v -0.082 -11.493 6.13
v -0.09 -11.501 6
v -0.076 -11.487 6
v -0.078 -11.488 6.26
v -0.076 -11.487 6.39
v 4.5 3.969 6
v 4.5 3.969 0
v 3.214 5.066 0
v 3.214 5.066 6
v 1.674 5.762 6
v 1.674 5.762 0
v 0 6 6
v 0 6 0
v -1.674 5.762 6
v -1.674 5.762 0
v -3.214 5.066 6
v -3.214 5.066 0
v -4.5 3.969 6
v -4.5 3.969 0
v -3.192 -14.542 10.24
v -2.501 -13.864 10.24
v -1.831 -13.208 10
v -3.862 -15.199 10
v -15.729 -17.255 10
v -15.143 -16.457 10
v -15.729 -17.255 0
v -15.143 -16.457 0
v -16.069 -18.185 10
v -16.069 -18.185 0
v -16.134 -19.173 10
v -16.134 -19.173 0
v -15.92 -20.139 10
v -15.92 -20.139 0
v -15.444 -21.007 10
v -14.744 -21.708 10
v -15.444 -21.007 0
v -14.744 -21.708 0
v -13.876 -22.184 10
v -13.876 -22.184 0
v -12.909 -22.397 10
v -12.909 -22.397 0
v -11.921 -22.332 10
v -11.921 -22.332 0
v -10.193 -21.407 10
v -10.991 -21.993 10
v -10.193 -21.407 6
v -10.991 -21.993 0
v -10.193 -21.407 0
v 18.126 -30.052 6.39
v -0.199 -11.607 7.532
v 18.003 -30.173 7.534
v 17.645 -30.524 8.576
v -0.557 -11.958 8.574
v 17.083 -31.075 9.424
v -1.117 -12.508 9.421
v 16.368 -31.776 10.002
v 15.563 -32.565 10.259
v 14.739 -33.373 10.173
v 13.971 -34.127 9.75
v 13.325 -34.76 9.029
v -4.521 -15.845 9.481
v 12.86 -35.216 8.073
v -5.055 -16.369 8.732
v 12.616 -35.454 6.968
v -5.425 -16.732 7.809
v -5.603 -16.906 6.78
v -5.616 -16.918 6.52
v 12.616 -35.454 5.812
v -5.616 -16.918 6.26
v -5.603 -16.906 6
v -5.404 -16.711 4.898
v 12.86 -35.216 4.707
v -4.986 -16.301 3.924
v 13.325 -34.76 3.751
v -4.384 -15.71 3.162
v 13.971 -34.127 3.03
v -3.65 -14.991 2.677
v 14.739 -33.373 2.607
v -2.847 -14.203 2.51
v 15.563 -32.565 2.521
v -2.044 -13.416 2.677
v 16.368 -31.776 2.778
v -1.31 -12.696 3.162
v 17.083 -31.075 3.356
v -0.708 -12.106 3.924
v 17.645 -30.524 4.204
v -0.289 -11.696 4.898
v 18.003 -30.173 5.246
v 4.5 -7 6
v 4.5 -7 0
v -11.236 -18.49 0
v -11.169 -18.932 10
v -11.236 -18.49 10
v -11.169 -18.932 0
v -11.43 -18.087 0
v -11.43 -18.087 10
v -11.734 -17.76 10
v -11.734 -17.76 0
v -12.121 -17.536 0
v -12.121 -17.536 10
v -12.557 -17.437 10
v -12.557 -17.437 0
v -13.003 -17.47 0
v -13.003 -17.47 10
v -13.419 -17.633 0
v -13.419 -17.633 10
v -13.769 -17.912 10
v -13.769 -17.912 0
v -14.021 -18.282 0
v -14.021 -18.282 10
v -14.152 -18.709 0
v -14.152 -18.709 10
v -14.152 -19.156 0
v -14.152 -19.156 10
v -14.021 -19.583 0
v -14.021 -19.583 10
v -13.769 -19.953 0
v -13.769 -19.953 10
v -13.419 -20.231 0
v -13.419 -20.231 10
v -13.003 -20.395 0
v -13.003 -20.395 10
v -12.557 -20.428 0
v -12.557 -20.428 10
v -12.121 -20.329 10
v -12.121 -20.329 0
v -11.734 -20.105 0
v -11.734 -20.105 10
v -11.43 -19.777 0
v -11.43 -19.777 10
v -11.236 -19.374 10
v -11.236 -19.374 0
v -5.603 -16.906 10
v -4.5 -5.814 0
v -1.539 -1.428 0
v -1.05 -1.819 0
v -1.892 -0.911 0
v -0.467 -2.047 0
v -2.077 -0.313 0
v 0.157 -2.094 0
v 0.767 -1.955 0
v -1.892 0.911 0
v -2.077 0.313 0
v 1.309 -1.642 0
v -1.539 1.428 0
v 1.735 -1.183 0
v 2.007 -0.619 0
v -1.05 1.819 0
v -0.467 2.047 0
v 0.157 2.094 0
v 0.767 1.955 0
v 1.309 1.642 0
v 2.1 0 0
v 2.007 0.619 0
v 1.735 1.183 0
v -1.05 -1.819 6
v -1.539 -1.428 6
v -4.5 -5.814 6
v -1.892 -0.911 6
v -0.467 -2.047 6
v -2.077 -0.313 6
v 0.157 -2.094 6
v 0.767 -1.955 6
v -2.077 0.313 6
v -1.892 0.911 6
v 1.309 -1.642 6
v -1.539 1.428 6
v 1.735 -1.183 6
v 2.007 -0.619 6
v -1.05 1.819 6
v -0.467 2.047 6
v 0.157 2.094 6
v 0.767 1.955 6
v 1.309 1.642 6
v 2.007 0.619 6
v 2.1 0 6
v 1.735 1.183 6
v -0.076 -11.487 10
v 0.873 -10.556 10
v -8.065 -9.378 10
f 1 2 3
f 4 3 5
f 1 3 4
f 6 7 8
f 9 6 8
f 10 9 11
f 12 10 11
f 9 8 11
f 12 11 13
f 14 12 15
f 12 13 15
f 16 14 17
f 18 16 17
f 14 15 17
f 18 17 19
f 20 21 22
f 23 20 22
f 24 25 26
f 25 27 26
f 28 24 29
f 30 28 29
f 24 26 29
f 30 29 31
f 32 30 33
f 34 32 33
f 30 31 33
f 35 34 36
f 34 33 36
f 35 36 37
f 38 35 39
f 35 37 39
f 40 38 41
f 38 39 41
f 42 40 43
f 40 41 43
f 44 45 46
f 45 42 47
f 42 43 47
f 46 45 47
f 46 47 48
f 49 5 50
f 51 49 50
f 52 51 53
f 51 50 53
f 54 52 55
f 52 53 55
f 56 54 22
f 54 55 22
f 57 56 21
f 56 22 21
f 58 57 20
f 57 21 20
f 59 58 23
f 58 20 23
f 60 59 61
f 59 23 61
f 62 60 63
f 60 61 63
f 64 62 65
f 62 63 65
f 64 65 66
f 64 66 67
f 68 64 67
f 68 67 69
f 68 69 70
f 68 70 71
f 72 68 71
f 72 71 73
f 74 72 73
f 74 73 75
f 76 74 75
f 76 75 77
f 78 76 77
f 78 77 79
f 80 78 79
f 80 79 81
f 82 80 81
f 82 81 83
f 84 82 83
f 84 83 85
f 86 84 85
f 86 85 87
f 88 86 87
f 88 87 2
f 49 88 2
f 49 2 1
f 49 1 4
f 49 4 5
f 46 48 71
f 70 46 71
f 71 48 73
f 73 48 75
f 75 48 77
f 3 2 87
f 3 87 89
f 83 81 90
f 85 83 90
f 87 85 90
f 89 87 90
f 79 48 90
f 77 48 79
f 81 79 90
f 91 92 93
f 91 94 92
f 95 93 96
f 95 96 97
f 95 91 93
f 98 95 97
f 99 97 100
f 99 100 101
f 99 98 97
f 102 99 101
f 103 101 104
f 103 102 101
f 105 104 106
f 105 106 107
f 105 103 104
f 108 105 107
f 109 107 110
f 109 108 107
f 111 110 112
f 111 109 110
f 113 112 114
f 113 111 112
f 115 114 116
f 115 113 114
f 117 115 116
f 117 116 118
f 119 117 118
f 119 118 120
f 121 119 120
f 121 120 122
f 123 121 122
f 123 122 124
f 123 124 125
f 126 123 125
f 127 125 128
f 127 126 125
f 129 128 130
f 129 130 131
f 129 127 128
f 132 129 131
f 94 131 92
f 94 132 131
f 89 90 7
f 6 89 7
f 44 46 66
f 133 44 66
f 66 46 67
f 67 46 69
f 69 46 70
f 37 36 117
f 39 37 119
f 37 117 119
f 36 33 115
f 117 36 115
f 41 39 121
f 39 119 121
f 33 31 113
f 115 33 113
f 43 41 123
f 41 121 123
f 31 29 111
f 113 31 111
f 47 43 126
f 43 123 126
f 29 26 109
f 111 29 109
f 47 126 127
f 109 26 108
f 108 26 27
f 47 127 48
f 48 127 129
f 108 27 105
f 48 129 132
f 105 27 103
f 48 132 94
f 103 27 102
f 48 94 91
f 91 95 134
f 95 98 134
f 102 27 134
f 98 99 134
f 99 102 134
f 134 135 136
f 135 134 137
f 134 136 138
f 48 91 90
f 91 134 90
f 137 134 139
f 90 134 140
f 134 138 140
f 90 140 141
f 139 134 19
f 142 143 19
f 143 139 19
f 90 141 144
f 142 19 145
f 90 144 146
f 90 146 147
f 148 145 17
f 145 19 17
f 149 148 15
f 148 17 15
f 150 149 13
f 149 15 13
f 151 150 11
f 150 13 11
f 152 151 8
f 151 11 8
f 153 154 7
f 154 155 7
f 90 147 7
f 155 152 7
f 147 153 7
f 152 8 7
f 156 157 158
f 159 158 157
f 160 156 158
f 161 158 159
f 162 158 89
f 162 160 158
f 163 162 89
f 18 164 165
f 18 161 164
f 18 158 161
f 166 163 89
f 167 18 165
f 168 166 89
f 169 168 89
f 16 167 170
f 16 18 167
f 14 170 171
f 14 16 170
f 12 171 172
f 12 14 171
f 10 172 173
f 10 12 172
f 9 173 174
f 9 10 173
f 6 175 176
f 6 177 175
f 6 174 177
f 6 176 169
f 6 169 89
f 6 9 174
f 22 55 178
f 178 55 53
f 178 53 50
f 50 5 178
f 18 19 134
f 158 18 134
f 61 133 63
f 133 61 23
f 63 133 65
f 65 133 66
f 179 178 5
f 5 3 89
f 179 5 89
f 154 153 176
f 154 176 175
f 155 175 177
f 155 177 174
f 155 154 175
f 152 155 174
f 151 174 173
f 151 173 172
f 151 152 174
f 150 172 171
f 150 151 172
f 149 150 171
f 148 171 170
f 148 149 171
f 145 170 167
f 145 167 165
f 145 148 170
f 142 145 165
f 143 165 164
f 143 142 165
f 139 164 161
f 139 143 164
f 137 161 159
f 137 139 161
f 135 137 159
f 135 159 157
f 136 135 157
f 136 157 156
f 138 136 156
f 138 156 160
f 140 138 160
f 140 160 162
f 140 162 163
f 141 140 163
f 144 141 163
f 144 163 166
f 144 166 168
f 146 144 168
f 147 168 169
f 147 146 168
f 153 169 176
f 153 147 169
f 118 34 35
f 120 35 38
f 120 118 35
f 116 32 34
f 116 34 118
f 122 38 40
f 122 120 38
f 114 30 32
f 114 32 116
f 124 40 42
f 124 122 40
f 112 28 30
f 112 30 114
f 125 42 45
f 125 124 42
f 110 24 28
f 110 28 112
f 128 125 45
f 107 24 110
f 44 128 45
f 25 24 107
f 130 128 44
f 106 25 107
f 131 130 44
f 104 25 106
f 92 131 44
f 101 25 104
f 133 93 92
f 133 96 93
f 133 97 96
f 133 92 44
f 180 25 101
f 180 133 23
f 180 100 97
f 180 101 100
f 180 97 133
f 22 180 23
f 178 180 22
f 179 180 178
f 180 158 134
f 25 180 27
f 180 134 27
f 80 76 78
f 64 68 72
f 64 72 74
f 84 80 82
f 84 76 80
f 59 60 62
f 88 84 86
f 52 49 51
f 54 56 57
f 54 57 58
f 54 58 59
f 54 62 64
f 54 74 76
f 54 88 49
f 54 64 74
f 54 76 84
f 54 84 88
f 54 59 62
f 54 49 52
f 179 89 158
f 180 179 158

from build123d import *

# Parameters (mm, degrees)
F0_R     = 1.5
F0_R_2   = 2.1
F1_DEPTH = 6
F2_R     = 3.88
F3_DEPTH = 26
F4_R     = 1.5
F5_DEPTH = 4
F6_SIZE  = 3.99999


# Not quite as in the source:
# - a fillet or chamfer is up to 0.001 mm smaller than in the source, because OpenCascade refuses the exact size


with BuildPart() as f1:
    # F0 (on Top) → F1 (new body)
    with BuildSketch(Plane.XY):
        with BuildLine():
            Line((4.5, 0), (4.5, 3.9686269666))
            ThreePointArc((4.5, 3.9686269666), (0, 6), (-4.5, 3.9686269666))
            Line((-4.5, 3.9686269666), (-4.5, 0))
            Line((-4.5, 0), (-4.5, -5.813701588))
            Line((-4.5, -5.813701588), (-15.143203234, -16.4569048219))
            ThreePointArc((-15.143203234, -16.4569048219), (-15.1189316865, -21.3823807428), (-10.1934557657, -21.4066522902))
            Line((-10.1934557657, -21.4066522902), (4.5, -7))
            Line((4.5, -7), (4.5, 0))
        make_face()
        with Locations((-12.6691633098, -18.9323580438)):
            Circle(F0_R, mode=Mode.SUBTRACT)
        Circle(F0_R_2, mode=Mode.SUBTRACT)
    extrude(amount=F1_DEPTH)

    # F2 (on face) → F3 (join)
    with BuildSketch(Plane(origin=(5.7049735344, -5.8185465008, 0), x_dir=(0.7140411723, 0.7001037097, 0), z_dir=(0.7001037097, -0.7140411723, 0))):
        with Locations((-11.9764822387, 6.39)):
            Circle(F2_R)
    extrude(amount=F3_DEPTH)

    # F4 (on face) → F5 (join)
    with BuildSketch(Plane.XY.offset(6)):
        with BuildLine():
            Line((-4.5, -5.813701588), (-15.143203234, -16.4569048219))
            ThreePointArc((-15.143203234, -16.4569048219), (-15.1189316865, -21.3823807428), (-10.1934557657, -21.4066522902))
            Line((-10.1934557657, -21.4066522902), (-5.6031765259, -16.9059713084))
            Line((-5.6031765259, -16.9059713084), (-0.0762481345, -11.4869237515))
            Line((-0.0762481345, -11.4869237515), (4.5, -7))
            Line((4.5, -7), (-4.5, -5.813701588))
        make_face()
        with Locations((-12.6691633098, -18.9323580438)):
            Circle(F4_R, mode=Mode.SUBTRACT)
    extrude(amount=F5_DEPTH)

    # F6 (size 4 in the source; OpenCascade refuses exactly that, so slightly less here)
    f6_edges = [f1.edges().sort_by_distance(p)[0] for p in [
        (0, -6.406851, 10),
    ]]
    chamfer(f6_edges, length=F6_SIZE)


solid = f1.part
